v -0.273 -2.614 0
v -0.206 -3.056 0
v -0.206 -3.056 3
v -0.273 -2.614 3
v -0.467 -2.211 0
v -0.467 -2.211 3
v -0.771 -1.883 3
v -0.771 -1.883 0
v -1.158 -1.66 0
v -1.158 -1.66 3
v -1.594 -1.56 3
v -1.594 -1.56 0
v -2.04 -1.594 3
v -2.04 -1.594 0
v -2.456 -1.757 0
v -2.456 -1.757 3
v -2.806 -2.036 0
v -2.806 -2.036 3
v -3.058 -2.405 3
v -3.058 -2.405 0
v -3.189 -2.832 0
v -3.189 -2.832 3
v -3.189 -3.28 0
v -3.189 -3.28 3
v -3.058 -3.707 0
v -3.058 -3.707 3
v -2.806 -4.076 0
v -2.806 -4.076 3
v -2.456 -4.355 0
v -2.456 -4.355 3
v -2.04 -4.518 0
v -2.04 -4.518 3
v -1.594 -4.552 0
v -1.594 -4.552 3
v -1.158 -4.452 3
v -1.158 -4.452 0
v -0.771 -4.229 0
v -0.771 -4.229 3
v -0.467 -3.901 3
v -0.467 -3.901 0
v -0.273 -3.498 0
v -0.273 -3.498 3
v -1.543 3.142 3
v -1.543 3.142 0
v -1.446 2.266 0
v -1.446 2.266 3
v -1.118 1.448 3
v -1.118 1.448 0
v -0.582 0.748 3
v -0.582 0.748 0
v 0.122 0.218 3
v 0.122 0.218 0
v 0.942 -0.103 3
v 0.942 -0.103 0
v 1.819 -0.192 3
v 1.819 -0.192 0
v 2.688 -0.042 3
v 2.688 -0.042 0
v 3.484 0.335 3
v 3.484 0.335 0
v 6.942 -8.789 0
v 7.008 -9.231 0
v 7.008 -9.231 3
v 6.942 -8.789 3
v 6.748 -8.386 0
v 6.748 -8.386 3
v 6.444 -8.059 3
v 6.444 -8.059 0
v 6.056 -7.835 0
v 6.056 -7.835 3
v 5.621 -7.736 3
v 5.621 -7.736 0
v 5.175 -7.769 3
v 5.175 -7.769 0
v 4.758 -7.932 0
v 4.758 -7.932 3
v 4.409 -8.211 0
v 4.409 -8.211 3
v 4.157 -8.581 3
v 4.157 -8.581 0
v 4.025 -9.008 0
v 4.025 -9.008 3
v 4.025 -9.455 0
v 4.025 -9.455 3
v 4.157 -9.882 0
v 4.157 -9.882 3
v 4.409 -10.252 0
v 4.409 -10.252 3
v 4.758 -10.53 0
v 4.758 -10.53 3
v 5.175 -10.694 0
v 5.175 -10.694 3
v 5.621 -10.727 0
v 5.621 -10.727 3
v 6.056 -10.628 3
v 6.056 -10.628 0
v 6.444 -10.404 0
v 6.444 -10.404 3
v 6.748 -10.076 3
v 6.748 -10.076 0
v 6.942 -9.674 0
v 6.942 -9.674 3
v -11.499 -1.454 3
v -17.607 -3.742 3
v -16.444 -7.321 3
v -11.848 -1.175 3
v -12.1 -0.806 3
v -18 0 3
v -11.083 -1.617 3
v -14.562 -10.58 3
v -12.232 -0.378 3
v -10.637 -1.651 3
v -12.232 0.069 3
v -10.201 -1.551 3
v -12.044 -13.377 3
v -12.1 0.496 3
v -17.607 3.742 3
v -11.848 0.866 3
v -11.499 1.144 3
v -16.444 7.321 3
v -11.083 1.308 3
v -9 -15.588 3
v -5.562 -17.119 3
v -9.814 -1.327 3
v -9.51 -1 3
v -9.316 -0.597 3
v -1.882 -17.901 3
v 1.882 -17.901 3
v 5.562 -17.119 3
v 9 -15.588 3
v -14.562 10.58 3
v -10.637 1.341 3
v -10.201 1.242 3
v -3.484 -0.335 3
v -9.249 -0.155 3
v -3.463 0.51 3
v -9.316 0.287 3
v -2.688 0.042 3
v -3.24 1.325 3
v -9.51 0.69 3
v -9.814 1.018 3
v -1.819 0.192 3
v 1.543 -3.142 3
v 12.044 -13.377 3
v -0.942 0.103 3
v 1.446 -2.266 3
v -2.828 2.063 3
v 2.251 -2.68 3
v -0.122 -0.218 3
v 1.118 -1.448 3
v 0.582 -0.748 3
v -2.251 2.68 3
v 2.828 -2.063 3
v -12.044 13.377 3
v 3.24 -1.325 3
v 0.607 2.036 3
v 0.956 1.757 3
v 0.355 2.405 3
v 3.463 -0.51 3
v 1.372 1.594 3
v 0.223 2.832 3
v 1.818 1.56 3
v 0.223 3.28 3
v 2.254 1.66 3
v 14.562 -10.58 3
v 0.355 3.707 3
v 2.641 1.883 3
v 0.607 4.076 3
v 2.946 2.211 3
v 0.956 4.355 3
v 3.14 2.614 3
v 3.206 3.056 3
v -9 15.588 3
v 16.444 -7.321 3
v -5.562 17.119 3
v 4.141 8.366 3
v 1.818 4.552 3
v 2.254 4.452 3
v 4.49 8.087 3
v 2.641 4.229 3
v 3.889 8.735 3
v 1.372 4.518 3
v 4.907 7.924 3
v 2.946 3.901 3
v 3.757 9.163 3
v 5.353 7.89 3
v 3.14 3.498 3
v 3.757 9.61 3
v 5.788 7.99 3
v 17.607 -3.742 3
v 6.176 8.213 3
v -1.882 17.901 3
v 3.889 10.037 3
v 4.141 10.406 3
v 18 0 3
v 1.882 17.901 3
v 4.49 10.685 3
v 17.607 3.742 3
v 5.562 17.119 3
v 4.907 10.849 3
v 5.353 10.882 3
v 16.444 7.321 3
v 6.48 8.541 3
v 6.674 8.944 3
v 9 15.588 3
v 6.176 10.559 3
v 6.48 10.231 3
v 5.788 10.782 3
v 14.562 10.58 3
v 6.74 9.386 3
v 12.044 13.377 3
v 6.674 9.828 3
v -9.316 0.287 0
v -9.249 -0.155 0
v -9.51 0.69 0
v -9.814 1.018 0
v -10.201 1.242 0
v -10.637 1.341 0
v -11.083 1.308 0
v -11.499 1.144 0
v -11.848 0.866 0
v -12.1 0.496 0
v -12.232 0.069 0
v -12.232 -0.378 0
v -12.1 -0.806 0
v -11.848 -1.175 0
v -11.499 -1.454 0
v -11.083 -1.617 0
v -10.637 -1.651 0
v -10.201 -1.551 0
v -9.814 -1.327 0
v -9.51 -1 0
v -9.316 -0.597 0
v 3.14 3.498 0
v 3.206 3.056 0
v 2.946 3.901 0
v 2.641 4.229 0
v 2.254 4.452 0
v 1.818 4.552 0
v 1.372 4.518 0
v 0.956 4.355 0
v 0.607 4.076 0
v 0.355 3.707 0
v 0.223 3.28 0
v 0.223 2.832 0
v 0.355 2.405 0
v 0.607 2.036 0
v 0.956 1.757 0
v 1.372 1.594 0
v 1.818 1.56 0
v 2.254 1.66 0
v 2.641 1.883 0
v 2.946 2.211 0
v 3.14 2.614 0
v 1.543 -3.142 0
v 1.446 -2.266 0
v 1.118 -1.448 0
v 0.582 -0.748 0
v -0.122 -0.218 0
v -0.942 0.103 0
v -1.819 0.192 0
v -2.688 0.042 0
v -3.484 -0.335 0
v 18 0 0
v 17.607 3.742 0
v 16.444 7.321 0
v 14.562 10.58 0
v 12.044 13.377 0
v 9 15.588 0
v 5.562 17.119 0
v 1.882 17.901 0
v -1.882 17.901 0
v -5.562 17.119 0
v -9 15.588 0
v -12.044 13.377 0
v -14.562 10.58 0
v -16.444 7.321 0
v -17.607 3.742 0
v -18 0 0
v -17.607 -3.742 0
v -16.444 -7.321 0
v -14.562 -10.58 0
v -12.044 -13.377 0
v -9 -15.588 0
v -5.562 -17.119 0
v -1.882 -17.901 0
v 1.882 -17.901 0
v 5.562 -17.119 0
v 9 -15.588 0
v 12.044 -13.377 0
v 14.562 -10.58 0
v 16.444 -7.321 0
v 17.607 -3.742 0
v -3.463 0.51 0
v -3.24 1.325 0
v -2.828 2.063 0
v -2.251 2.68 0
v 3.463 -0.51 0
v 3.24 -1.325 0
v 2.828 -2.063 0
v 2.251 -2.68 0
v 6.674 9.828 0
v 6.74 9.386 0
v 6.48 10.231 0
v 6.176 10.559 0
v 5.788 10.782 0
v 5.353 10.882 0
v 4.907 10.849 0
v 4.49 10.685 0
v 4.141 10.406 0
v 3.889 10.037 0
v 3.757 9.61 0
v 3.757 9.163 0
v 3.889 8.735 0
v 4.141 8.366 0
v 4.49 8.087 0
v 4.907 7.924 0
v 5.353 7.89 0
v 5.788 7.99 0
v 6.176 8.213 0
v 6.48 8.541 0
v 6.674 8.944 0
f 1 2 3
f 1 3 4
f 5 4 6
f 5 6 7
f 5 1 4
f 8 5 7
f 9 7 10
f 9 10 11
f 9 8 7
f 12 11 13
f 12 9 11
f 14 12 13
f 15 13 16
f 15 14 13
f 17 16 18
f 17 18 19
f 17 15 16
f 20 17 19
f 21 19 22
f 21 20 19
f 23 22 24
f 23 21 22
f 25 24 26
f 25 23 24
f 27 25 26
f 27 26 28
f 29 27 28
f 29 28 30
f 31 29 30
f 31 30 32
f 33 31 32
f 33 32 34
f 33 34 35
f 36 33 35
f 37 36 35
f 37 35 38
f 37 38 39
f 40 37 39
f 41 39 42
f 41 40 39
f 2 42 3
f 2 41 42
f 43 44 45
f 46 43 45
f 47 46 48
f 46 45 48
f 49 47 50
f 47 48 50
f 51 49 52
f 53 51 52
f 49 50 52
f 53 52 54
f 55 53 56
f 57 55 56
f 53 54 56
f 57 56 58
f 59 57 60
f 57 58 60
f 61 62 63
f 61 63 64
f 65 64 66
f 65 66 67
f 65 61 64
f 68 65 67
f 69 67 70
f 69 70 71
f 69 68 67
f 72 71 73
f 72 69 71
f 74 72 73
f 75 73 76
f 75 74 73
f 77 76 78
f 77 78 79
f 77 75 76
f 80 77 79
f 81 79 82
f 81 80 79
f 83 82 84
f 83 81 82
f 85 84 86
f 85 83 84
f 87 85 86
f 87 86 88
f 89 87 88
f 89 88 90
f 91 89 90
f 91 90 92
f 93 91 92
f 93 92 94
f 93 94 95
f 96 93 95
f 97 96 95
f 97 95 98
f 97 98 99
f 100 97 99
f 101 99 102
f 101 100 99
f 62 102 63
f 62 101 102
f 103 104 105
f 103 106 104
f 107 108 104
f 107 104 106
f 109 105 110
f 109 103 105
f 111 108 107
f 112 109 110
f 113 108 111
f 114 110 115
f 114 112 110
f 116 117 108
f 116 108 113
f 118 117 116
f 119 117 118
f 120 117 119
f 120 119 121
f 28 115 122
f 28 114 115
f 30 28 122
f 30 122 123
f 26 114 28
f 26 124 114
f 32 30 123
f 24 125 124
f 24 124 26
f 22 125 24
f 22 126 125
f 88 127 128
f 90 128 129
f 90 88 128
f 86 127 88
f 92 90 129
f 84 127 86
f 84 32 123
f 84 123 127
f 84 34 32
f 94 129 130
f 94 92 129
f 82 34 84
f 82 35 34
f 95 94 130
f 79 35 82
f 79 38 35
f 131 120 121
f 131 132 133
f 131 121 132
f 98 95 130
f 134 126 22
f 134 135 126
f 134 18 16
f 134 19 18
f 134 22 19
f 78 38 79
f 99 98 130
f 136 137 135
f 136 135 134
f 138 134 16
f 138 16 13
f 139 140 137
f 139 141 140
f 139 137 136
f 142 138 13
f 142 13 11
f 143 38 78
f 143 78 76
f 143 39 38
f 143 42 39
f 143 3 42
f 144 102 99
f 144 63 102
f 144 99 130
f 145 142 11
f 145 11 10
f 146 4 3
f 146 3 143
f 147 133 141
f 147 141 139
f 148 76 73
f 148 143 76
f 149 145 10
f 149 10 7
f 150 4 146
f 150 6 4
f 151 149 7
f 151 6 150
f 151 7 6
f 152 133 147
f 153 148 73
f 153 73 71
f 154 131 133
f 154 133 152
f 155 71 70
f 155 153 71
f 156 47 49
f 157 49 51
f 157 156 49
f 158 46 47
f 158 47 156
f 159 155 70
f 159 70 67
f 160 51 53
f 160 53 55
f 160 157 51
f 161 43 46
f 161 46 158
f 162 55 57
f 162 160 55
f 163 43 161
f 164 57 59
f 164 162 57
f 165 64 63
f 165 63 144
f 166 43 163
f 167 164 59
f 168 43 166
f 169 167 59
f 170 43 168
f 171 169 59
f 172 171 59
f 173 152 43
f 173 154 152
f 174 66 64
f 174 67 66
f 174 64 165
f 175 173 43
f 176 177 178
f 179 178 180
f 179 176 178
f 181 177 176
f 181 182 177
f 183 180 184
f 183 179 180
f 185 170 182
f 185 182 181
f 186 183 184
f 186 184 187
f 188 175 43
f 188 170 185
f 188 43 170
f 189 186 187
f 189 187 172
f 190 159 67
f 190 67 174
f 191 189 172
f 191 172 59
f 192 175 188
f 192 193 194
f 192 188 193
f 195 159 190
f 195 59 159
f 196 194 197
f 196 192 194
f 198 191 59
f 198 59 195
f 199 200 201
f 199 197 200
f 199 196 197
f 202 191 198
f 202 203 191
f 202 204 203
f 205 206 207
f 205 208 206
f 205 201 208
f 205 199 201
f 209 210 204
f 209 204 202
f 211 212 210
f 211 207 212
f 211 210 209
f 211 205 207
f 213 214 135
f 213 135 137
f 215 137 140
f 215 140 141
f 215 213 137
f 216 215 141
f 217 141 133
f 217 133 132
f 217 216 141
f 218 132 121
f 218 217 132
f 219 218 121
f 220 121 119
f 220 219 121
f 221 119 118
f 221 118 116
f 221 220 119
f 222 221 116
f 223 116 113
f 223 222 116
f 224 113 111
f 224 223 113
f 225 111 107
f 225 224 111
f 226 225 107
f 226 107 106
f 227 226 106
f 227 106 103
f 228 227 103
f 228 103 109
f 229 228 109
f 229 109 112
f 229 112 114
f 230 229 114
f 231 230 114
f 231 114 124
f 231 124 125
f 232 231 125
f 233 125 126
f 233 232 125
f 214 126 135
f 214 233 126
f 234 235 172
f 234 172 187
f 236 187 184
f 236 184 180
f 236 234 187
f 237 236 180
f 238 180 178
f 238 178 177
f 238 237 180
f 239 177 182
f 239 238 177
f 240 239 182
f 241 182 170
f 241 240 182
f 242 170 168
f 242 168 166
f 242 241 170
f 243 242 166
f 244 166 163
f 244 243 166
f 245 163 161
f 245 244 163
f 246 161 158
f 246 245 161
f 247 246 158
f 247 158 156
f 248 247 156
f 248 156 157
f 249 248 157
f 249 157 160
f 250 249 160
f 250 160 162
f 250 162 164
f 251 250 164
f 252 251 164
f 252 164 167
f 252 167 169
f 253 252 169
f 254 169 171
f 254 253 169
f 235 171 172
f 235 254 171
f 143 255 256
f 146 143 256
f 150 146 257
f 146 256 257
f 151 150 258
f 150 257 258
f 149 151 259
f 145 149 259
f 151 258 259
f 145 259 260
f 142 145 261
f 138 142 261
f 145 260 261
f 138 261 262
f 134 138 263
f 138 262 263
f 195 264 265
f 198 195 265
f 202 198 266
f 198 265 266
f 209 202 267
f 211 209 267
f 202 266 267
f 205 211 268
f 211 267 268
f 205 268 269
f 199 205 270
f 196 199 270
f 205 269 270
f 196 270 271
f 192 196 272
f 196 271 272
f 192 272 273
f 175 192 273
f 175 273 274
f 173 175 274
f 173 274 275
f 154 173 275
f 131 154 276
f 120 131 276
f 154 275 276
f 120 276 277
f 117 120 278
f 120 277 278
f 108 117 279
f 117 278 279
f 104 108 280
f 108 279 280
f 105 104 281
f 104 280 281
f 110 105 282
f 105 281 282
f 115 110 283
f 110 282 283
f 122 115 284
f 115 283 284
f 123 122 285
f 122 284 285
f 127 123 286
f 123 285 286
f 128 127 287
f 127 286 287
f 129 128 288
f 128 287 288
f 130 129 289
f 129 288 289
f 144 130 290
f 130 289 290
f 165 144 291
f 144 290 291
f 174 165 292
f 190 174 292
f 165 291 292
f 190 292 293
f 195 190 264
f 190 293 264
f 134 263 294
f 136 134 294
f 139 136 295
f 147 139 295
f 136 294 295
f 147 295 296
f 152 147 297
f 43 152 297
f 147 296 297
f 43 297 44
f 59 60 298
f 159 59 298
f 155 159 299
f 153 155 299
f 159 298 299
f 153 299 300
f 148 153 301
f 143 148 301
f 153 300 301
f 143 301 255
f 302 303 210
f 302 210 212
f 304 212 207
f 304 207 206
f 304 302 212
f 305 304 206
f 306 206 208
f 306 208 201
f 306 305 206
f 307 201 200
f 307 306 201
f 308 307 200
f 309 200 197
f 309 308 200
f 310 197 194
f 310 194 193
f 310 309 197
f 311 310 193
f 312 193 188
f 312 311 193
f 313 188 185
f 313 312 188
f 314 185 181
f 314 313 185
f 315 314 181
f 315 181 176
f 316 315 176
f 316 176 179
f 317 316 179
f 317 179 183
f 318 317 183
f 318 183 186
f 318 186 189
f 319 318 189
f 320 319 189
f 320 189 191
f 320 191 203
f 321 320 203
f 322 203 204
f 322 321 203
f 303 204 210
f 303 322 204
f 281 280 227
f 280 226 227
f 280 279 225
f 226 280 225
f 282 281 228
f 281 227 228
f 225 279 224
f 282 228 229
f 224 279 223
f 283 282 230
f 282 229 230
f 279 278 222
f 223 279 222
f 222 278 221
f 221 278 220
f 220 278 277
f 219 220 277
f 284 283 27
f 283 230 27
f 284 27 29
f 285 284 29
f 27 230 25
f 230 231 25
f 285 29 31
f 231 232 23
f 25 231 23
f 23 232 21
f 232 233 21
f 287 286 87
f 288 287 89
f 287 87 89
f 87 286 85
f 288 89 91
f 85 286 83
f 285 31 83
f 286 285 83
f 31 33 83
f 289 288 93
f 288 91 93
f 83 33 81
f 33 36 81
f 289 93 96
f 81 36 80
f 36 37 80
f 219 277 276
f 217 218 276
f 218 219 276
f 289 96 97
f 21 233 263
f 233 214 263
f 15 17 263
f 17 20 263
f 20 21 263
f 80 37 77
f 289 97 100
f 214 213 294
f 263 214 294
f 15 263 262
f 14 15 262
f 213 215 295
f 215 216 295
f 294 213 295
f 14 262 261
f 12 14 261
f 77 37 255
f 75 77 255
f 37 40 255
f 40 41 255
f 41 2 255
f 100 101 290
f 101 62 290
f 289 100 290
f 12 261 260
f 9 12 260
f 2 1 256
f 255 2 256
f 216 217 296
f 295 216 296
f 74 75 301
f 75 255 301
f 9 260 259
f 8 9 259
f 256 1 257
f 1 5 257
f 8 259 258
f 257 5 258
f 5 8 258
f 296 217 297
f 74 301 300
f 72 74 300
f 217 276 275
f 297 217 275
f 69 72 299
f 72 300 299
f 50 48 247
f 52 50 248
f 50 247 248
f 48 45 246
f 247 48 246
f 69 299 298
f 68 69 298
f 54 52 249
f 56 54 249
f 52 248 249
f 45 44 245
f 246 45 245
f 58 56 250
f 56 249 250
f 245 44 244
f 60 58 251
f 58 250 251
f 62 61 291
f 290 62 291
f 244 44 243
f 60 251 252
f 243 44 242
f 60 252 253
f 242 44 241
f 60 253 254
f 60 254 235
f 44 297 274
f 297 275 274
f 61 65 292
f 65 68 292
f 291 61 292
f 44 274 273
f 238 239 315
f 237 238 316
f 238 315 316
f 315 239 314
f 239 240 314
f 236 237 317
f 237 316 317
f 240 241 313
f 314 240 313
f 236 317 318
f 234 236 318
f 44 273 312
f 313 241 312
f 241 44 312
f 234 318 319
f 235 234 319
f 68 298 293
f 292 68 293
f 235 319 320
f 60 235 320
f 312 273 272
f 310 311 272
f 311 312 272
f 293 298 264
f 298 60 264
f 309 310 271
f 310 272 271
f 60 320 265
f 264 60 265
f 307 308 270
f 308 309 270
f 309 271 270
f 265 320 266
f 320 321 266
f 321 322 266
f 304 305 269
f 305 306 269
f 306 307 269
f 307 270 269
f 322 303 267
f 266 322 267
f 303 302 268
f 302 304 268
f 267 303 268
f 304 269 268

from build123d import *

# Parameters (mm, degrees)
ESQUISSE1_R        = 18
ESQUISSE1_R_2      = 1.5
BOSS_EXTRU_1_DEPTH = 3


with BuildPart() as part:
    # Esquisse1 → Boss.-Extru.1 (new body)
    with BuildSketch(Plane.XY):
        Circle(ESQUISSE1_R)
        with Locations((5.240453276, 9.386167986)):
            Circle(ESQUISSE1_R_2, mode=Mode.SUBTRACT)
        with Locations((-1.70619409, -3.05596167)):
            Circle(ESQUISSE1_R_2, mode=Mode.SUBTRACT)
        with Locations((1.70619409, 3.05596167)):
            Circle(ESQUISSE1_R_2, mode=Mode.SUBTRACT)
        with Locations((5.508433282, -9.231449657)):
            Circle(ESQUISSE1_R_2, mode=Mode.SUBTRACT)
        with Locations((-10.748886558, -0.154718329)):
            Circle(ESQUISSE1_R_2, mode=Mode.SUBTRACT)
        with BuildLine():
            ThreePointArc((1.54267531, -3.141679947), (-0.121871006, -0.218282976), (-3.483906341, -0.335256035))
            ThreePointArc((-3.483906341, -0.335256035), (-3.05596167, 1.70619409), (-1.54267531, 3.141679947))
            ThreePointArc((-1.54267531, 3.141679947), (0.121871006, 0.218282976), (3.483906341, 0.335256035))
            ThreePointArc((3.483906341, 0.335256035), (3.05596167, -1.70619409), (1.54267531, -3.141679947))
        make_face(mode=Mode.SUBTRACT)
    extrude(amount=BOSS_EXTRU_1_DEPTH)


solid = part.part
